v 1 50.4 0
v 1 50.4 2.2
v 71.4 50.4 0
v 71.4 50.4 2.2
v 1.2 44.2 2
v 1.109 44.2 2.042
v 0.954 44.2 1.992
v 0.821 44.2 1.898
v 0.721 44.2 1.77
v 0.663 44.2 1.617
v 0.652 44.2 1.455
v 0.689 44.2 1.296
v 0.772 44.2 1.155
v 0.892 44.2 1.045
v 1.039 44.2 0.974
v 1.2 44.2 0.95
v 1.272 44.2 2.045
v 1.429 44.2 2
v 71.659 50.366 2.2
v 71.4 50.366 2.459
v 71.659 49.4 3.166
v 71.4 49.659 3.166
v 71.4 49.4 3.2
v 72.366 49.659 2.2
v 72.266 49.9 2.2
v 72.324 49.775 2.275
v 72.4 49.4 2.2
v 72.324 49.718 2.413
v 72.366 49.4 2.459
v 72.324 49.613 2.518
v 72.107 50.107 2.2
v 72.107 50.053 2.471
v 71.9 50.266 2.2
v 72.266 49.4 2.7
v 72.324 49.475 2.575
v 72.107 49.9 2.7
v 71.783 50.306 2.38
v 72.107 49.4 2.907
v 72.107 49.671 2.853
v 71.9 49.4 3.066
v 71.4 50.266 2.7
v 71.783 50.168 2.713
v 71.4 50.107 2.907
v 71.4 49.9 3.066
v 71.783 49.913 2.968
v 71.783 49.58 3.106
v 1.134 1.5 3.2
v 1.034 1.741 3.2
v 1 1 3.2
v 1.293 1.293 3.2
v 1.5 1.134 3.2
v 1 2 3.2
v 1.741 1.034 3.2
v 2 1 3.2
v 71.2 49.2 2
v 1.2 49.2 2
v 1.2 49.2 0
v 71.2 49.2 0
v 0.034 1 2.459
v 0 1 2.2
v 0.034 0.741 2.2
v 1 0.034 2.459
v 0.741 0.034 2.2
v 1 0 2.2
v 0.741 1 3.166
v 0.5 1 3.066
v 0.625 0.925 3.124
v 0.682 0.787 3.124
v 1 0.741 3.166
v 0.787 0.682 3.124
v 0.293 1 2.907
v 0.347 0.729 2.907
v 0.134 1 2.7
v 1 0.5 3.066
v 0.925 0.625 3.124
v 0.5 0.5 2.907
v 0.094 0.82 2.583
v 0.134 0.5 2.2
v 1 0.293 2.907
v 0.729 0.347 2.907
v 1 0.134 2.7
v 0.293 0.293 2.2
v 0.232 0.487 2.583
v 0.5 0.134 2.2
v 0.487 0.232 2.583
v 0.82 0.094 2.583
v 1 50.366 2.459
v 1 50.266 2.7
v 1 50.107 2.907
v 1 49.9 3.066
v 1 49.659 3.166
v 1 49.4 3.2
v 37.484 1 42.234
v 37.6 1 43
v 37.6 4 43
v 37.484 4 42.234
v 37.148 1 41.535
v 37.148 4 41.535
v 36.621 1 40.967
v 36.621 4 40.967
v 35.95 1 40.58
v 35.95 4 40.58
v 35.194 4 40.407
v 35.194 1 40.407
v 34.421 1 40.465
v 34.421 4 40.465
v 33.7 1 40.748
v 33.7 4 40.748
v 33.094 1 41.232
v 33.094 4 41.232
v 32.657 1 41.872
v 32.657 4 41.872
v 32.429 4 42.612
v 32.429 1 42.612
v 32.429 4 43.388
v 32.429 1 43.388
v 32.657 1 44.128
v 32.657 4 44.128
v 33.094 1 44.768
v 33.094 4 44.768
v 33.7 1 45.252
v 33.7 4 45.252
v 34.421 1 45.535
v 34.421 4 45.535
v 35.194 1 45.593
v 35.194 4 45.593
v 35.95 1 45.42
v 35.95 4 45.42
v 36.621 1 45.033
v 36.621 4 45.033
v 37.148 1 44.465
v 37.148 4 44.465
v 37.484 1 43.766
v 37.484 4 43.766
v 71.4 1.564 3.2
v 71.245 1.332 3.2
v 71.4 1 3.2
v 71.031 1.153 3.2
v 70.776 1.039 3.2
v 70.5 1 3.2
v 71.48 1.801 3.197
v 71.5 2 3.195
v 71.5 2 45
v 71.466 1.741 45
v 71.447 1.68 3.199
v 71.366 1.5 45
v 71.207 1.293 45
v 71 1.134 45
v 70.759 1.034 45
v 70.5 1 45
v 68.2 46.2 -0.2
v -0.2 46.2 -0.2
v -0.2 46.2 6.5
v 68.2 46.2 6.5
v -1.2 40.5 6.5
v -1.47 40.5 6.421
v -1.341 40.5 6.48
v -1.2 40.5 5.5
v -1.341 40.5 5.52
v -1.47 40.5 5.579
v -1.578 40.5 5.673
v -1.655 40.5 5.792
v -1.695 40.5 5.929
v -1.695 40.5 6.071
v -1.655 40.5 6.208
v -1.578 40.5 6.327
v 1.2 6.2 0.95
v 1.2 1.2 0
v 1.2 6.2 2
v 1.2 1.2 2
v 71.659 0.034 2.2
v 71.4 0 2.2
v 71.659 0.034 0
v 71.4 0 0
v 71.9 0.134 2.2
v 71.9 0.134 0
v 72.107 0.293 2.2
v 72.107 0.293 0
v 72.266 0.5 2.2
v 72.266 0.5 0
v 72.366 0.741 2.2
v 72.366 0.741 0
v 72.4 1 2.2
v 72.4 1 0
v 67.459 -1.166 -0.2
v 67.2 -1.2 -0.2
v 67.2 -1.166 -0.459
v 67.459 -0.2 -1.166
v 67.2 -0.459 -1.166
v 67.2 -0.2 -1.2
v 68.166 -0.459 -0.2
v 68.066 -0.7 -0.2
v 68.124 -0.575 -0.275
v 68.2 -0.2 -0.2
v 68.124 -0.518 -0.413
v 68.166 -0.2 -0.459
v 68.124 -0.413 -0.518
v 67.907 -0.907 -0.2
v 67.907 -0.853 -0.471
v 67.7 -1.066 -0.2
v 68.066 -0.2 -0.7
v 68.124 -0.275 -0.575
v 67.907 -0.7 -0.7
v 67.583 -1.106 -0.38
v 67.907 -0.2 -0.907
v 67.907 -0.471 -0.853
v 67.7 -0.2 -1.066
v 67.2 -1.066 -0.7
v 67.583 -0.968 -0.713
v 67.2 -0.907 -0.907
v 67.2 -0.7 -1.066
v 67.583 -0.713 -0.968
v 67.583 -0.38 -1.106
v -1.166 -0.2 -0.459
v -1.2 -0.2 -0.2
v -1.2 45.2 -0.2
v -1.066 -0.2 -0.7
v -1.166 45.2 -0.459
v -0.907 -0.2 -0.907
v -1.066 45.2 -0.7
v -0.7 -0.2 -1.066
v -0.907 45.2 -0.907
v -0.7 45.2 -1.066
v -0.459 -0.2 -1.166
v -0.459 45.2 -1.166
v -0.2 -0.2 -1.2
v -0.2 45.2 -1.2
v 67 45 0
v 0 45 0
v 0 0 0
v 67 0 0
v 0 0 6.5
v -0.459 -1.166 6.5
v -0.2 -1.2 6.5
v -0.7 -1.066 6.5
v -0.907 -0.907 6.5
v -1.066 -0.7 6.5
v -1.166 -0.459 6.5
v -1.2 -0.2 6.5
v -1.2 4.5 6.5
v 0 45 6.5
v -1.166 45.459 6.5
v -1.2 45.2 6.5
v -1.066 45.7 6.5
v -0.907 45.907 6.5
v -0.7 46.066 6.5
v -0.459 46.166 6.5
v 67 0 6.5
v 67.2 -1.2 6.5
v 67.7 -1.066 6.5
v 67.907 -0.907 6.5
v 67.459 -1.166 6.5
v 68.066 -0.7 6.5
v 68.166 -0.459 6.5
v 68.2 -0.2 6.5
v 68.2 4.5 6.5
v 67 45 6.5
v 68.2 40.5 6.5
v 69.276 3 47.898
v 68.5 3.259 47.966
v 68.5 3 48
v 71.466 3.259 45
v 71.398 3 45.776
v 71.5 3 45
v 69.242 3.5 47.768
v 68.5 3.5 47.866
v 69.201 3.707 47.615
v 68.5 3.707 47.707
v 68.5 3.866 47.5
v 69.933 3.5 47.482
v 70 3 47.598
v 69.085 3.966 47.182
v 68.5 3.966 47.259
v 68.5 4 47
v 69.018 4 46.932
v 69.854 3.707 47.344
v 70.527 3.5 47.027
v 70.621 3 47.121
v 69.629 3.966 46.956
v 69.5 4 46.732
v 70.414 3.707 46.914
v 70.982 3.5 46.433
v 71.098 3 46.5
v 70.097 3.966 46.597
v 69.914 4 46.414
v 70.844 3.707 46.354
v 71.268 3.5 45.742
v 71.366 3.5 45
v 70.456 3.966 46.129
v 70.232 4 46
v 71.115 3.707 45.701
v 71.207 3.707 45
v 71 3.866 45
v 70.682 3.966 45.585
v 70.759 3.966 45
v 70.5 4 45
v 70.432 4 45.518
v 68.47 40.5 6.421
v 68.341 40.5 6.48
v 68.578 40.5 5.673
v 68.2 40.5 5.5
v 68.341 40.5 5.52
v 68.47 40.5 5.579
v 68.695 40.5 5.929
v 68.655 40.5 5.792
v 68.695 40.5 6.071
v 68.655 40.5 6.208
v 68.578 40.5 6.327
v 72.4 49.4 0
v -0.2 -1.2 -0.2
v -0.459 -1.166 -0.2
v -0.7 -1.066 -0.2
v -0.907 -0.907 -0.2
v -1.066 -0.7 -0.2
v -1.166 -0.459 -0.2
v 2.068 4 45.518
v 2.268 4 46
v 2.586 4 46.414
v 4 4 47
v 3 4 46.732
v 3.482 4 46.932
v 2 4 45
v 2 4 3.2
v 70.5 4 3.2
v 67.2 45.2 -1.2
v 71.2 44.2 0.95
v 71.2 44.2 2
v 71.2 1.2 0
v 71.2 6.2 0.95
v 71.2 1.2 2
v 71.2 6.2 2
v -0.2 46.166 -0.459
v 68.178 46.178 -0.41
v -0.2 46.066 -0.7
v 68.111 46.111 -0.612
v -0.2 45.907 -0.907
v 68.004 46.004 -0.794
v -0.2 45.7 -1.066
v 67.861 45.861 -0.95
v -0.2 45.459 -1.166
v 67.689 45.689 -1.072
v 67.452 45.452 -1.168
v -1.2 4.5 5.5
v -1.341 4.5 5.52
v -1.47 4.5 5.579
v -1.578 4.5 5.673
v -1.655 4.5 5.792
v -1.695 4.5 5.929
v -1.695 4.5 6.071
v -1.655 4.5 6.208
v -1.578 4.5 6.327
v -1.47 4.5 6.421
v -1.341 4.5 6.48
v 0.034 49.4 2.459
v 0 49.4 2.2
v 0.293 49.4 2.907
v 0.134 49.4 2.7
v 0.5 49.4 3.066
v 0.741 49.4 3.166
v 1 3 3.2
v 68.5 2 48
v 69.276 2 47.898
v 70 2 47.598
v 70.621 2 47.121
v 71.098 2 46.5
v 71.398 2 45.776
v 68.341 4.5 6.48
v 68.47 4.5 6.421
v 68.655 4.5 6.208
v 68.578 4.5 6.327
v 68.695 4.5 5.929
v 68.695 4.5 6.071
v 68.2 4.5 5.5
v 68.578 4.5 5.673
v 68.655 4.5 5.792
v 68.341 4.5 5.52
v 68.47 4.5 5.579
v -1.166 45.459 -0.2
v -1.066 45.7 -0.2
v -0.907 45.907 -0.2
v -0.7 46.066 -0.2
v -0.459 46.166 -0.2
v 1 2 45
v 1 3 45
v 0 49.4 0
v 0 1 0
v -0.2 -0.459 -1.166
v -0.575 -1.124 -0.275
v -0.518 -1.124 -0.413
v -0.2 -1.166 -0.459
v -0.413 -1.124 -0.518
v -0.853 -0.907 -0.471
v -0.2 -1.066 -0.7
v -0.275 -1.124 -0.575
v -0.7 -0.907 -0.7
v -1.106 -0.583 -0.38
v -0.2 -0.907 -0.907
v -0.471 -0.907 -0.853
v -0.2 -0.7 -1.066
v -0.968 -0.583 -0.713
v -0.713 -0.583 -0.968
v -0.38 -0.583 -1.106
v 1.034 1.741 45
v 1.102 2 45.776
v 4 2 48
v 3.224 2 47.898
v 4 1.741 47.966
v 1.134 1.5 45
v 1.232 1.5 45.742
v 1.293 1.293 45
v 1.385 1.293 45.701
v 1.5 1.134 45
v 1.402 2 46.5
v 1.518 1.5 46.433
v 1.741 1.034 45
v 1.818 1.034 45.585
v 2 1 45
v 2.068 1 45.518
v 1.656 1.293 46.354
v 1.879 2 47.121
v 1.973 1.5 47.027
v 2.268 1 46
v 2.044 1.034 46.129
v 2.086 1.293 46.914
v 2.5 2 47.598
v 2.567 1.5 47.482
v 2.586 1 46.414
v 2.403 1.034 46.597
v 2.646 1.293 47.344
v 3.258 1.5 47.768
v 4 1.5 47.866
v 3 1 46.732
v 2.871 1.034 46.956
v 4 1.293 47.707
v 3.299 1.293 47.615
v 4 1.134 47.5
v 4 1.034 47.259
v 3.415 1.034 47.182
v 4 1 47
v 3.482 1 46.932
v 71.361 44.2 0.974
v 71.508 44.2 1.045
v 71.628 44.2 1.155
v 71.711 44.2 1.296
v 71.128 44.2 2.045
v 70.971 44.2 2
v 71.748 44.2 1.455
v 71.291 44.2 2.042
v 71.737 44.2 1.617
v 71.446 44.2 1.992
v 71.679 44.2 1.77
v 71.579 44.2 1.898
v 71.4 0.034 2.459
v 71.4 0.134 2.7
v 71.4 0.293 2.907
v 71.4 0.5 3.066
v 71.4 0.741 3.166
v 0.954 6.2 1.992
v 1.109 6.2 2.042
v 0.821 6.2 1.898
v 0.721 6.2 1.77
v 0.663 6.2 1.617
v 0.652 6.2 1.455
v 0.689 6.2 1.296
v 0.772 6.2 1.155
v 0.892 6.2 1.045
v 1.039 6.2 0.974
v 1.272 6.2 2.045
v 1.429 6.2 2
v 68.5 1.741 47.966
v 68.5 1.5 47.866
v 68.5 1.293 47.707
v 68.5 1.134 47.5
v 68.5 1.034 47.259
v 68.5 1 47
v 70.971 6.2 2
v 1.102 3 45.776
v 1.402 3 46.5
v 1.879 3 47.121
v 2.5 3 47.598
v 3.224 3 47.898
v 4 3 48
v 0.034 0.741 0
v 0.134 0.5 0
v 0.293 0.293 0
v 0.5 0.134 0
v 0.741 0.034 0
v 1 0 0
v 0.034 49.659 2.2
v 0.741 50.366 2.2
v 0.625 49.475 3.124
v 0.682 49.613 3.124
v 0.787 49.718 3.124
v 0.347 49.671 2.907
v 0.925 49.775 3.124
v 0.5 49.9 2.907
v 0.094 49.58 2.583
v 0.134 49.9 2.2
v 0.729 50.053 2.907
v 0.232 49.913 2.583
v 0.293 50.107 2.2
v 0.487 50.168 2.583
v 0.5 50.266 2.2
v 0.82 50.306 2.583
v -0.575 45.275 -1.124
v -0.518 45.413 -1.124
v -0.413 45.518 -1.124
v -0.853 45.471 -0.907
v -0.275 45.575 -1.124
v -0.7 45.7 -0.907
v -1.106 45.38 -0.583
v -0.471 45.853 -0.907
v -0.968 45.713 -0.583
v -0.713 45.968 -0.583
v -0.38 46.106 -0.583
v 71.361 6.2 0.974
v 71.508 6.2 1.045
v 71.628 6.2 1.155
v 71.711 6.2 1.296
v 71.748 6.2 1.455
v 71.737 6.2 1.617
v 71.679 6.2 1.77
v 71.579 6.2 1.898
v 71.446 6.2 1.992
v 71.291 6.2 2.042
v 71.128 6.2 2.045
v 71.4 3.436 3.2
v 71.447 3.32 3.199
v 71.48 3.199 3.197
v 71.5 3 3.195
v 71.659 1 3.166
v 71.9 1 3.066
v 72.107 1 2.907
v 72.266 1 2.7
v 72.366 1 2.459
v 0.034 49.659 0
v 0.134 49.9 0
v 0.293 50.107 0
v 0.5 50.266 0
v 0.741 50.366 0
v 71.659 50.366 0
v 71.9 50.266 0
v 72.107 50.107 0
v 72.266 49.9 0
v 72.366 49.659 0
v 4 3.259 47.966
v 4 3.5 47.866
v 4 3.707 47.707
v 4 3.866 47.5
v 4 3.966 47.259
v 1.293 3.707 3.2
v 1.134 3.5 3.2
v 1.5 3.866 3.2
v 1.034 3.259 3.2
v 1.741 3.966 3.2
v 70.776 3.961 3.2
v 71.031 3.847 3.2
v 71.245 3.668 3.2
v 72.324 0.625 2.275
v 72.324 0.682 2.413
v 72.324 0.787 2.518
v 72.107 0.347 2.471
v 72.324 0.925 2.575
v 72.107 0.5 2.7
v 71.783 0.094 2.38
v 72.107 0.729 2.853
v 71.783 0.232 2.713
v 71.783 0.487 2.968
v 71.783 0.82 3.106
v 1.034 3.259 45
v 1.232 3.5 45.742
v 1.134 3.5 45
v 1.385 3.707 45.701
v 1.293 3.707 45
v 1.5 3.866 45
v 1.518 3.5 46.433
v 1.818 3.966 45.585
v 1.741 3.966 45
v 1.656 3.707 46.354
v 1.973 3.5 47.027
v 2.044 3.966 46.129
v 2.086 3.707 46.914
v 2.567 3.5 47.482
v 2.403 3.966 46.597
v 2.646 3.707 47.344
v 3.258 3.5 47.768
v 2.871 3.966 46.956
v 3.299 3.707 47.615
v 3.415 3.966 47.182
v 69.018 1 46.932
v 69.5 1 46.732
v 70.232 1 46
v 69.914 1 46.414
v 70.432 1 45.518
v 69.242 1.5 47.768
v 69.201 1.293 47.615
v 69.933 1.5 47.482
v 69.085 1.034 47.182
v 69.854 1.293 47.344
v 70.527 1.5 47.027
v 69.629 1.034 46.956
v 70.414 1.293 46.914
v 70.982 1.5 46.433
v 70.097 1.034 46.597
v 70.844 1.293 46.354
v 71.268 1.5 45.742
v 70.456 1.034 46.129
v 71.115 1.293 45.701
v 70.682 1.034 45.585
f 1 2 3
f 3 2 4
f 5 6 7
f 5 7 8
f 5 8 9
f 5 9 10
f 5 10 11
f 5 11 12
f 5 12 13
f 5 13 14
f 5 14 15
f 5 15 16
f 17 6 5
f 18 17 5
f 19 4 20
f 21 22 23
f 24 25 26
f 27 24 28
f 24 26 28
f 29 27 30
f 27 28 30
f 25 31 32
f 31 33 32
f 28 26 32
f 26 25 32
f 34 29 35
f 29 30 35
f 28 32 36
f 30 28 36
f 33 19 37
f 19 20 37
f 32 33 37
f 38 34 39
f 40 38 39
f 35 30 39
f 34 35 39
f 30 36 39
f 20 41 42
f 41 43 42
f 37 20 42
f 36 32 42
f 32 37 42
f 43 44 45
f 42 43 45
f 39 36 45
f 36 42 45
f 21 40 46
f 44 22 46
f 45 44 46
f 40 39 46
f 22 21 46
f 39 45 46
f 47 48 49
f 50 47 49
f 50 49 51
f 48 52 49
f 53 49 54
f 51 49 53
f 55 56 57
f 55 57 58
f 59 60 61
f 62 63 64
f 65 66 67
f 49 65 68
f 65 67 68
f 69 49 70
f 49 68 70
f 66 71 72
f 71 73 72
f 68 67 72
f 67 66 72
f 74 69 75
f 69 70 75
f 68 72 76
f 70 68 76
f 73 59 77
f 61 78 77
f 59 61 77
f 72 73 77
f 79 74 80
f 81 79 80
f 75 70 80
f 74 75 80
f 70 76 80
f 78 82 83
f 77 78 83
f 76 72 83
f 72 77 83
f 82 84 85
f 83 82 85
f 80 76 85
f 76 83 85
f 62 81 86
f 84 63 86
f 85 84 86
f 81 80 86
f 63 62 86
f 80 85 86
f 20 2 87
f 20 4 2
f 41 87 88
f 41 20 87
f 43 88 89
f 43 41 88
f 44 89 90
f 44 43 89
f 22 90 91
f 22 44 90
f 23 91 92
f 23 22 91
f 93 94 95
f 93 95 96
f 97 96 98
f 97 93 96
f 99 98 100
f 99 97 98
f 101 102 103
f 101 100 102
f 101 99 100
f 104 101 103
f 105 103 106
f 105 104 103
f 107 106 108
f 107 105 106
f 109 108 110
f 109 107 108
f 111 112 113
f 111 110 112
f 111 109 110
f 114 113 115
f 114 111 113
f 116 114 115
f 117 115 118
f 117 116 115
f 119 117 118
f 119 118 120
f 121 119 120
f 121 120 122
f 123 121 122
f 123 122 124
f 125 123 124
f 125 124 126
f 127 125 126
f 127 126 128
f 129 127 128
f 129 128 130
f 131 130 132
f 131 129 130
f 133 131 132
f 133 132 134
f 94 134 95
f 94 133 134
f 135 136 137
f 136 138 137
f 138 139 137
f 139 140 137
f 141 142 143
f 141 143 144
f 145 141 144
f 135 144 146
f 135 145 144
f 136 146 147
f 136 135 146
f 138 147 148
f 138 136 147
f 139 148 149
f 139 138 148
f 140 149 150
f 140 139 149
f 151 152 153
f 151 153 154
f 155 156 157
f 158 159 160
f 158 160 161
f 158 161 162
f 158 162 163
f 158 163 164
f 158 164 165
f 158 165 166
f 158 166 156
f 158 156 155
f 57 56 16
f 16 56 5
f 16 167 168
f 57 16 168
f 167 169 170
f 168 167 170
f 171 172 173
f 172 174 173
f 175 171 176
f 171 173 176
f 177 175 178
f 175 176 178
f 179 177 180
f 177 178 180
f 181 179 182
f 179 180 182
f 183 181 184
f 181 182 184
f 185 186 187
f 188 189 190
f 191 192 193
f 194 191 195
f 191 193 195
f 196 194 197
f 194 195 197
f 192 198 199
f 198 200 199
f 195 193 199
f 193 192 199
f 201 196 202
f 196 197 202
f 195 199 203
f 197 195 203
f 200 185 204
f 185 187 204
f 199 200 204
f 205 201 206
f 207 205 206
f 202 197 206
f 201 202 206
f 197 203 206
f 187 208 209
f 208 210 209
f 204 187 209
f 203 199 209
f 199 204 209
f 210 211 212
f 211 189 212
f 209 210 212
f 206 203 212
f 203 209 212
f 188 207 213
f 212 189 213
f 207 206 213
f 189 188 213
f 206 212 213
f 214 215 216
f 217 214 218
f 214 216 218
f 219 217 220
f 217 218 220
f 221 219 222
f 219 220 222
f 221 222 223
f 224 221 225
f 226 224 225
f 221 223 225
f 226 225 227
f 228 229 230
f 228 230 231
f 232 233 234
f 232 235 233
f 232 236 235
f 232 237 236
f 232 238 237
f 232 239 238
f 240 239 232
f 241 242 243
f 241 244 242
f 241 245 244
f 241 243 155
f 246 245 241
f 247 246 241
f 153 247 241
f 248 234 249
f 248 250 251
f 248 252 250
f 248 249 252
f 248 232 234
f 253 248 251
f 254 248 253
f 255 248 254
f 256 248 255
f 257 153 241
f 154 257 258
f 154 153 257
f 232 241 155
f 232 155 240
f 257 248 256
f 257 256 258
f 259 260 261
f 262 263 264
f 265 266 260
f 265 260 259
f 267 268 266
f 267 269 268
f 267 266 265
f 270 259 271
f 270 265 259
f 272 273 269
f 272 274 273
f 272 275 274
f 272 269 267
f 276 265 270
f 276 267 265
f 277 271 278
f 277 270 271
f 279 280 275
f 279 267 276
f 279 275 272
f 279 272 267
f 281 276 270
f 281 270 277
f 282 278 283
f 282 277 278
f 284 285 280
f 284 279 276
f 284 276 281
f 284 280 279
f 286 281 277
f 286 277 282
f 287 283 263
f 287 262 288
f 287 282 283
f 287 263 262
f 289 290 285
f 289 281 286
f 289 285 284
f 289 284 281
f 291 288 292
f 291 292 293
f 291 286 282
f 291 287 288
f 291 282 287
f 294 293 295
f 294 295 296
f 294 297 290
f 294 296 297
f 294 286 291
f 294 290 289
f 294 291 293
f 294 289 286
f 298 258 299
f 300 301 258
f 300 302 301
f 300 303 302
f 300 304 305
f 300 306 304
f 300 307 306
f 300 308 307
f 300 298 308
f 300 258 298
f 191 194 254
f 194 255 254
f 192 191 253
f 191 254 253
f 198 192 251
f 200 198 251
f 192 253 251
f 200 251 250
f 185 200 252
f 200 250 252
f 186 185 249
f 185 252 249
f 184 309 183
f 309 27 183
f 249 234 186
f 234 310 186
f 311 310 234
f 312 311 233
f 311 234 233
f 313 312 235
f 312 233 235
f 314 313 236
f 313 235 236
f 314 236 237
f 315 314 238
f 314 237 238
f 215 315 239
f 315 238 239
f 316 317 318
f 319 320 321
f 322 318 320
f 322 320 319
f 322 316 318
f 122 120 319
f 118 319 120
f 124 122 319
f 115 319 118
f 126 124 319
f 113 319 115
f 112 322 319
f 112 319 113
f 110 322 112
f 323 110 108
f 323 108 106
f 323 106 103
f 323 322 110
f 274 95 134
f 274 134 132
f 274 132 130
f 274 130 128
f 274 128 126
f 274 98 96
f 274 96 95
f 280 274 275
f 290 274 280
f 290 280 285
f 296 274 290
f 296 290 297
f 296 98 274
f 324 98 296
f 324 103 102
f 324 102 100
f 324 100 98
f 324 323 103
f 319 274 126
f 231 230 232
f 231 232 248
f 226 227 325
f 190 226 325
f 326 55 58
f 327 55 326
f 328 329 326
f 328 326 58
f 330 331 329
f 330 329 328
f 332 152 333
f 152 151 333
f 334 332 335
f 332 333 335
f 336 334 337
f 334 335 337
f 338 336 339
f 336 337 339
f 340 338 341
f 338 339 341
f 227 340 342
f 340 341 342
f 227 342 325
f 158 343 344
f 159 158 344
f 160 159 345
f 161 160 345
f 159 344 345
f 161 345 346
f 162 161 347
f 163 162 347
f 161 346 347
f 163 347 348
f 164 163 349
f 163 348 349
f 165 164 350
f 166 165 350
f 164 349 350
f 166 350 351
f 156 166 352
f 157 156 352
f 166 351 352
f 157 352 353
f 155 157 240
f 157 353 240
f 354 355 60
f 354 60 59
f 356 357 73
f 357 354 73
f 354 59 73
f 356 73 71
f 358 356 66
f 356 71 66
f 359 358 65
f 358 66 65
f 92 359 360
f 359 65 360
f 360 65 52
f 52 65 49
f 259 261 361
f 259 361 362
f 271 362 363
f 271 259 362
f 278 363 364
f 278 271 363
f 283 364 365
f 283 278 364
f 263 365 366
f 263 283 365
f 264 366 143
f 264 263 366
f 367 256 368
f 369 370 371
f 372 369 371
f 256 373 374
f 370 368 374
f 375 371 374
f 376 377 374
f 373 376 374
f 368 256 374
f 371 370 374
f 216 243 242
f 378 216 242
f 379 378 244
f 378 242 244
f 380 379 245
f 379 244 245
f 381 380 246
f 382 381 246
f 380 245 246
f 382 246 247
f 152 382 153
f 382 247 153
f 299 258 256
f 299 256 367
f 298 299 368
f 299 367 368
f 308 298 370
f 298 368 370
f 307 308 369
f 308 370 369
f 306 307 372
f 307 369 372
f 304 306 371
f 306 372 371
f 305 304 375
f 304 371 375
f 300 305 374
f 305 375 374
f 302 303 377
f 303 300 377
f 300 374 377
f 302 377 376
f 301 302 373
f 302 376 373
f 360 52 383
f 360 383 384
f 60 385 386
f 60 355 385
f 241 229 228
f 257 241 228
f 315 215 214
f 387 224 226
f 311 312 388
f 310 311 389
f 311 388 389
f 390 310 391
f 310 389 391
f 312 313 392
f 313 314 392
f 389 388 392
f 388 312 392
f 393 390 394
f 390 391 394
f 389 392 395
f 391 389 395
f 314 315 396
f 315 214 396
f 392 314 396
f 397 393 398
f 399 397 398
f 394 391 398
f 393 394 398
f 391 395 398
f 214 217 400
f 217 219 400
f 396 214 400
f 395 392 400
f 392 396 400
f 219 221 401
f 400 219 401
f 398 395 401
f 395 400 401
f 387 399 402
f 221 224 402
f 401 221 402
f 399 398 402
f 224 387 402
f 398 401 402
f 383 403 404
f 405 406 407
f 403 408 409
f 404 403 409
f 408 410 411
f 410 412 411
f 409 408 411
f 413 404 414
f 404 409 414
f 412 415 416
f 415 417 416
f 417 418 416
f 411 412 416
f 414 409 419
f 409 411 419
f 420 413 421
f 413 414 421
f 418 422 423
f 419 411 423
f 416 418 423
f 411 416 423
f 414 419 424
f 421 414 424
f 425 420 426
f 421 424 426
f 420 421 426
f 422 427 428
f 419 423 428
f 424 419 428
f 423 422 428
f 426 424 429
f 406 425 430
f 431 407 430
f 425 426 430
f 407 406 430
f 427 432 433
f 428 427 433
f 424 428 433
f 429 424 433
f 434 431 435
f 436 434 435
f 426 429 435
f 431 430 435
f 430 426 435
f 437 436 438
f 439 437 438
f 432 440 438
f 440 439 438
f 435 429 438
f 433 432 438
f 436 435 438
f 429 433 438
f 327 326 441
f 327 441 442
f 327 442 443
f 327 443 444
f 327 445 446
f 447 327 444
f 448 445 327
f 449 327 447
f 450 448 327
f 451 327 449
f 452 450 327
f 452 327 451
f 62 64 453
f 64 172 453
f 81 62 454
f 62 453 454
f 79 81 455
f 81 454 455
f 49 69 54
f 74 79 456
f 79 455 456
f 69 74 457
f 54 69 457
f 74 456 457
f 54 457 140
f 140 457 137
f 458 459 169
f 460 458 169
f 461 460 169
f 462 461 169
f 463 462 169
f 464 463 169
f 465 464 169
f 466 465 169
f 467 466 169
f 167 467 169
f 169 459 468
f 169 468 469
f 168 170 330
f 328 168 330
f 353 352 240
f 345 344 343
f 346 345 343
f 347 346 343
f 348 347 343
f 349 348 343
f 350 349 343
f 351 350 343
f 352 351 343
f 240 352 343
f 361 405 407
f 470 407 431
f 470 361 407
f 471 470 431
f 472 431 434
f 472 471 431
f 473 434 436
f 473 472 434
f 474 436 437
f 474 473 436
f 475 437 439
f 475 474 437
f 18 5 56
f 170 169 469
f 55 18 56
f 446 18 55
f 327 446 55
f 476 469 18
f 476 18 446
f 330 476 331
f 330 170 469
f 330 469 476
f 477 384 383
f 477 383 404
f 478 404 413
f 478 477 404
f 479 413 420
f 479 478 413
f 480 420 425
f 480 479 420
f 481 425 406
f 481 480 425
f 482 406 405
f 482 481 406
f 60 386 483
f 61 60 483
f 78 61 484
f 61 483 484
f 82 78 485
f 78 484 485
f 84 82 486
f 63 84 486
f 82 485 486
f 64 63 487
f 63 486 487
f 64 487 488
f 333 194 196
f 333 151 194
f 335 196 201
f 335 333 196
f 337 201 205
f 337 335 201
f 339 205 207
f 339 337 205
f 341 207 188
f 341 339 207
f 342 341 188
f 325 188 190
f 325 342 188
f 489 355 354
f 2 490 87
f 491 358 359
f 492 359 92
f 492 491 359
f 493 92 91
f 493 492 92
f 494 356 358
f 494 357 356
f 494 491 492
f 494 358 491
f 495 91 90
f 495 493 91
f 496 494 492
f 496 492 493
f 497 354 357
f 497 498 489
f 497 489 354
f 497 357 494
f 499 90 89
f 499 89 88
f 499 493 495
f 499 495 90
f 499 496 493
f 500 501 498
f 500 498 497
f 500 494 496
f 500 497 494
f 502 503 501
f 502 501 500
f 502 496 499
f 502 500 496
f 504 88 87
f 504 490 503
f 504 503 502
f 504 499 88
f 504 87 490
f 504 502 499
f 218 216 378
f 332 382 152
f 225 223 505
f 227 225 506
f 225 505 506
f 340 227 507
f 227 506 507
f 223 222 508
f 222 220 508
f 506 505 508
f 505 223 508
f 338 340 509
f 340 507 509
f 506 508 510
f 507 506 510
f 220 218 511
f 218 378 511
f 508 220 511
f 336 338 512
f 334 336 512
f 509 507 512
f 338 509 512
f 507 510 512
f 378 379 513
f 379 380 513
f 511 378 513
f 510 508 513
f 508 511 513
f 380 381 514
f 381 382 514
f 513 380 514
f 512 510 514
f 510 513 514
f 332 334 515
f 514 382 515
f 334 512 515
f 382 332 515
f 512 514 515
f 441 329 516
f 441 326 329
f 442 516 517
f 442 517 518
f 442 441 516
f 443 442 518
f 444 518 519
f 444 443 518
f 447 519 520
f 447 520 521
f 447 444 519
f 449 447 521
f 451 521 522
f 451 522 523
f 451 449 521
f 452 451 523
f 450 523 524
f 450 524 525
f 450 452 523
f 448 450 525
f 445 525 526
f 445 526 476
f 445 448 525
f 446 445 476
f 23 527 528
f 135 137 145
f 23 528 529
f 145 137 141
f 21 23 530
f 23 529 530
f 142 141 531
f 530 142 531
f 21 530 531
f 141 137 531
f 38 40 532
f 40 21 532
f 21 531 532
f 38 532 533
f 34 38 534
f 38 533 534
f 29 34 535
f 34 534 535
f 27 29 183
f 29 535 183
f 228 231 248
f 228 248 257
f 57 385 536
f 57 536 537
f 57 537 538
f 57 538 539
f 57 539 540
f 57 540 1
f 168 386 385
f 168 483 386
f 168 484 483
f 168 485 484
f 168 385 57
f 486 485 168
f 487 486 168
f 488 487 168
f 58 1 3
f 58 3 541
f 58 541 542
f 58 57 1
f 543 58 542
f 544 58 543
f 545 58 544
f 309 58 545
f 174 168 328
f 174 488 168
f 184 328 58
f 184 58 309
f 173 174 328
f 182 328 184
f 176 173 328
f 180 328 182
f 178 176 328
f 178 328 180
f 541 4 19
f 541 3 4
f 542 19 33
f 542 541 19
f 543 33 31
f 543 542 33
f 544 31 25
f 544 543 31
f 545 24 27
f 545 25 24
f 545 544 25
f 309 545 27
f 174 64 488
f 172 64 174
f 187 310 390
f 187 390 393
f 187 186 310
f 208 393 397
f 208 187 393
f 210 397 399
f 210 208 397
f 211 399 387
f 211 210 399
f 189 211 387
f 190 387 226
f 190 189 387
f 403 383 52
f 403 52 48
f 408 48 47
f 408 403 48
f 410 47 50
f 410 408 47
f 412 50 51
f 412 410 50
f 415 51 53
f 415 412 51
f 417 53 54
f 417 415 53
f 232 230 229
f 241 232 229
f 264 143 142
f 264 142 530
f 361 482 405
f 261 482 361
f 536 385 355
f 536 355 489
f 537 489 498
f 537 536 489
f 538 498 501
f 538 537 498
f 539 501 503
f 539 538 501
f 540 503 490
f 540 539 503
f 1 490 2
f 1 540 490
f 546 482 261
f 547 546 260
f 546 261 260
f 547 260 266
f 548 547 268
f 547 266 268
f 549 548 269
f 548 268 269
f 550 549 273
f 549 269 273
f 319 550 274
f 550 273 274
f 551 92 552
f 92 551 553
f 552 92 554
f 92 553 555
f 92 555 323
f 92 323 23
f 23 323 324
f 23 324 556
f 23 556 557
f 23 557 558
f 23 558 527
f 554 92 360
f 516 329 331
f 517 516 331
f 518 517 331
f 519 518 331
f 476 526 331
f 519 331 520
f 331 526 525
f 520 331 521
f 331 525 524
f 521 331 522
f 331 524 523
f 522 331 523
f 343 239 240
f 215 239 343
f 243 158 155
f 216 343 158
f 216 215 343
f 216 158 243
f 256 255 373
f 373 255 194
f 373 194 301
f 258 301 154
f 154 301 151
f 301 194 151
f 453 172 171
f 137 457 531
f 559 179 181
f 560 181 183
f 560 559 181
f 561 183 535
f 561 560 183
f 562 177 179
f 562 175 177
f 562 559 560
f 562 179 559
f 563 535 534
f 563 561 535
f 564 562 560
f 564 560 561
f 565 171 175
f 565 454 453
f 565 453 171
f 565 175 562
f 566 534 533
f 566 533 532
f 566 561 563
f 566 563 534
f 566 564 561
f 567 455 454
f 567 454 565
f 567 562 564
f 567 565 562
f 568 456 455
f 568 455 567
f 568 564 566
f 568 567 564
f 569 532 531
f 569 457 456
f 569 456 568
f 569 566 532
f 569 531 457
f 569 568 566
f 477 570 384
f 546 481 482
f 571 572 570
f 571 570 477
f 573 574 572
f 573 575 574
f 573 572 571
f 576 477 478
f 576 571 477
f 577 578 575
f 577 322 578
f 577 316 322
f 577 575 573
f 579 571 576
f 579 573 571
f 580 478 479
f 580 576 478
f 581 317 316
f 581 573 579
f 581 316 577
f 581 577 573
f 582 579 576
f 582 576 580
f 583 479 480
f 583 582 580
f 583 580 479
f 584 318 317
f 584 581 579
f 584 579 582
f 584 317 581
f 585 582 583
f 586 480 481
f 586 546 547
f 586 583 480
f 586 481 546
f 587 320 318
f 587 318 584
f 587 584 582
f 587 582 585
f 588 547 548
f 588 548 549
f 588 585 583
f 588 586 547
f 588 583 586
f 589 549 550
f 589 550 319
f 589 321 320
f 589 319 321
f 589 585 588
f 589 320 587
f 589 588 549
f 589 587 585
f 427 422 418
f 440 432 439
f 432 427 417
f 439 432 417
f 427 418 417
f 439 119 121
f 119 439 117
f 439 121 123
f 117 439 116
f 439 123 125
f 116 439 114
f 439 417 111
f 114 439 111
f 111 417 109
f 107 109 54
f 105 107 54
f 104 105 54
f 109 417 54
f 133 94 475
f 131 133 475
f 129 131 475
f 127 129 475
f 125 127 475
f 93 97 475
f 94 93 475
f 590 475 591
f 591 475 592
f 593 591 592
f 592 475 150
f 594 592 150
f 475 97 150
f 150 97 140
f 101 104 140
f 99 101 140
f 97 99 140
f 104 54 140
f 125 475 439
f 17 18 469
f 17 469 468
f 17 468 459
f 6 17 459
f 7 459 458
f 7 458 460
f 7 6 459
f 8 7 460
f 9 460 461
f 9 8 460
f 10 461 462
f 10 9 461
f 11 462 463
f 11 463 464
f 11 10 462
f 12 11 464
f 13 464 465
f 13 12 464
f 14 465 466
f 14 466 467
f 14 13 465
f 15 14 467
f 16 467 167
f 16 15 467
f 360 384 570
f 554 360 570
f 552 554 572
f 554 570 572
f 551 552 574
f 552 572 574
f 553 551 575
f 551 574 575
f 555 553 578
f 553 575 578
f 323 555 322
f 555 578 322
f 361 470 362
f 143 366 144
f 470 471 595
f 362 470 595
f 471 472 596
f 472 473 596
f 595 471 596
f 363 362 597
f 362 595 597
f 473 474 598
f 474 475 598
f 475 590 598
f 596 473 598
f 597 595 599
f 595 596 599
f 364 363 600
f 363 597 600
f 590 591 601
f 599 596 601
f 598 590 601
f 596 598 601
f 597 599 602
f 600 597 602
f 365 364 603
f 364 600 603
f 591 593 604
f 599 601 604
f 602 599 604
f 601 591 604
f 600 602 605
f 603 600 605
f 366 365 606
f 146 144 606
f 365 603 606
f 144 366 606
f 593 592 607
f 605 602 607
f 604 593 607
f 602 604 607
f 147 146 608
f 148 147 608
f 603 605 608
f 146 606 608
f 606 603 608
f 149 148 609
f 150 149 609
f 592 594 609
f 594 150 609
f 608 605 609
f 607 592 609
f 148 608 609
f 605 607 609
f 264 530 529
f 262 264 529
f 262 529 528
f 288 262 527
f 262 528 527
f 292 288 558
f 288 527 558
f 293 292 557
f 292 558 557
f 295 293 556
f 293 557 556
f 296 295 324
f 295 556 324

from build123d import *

# Parameters (mm, degrees)
TONGUE_LEFT_R             = 0.5
TONGUE_LEFT_DEPTH         = 36
TONGUE_RIGHT_R            = 0.5
TONGUE_RIGHT_DEPTH        = 36
CASE_INSIDE_W             = 67
CASE_INSIDE_H             = 45
CASE_INSIDE_DEPTH         = 6.5
CASE_OUTSIDE_W            = 69.4
CASE_OUTSIDE_H            = 47.4
CASE_OUTSIDE_DEPTH        = 7.7
FILLET_R                  = 1
CYLINDER_R                = 2.6
CYLINDER_DEPTH            = 10
BOX_W                     = 70.5
BOX_H                     = 3
BOX_DEPTH                 = 45
FILLET002_R               = 3
FILLET003_R               = 1
LID_GROOVE_LEFT_R         = 0.55
LID_GROOVE_LEFT_DEPTH     = 38
LID_GROOVE_RIGHT_R        = 0.55
LID_GROOVE_RIGHT_DEPTH    = 38
LID_INSIDE_W              = 70
LID_INSIDE_H              = 48
LID_INSIDE_DEPTH          = 2
LID_OUTSIDE_W             = 72.4
LID_OUTSIDE_H             = 50.4
LID_OUTSIDE_DEPTH         = 3.2
FILLET001_R               = 1
FILLET001_PLACEMENT_ANGLE = 180


with BuildPart() as tongue_left:
    # tongue_left → tongue_left (new body)
    with BuildSketch(Plane(origin=(-1.2, 4.5, 6), x_dir=(1, 0, 0), z_dir=(0, 1, 0))):
        Circle(TONGUE_LEFT_R)
    extrude(amount=TONGUE_LEFT_DEPTH)


with BuildPart() as tongue_right:
    # tongue_right → tongue_right (new body)
    with BuildSketch(Plane(origin=(68.2, 4.5, 6), x_dir=(1, 0, 0), z_dir=(0, 1, 0))):
        Circle(TONGUE_RIGHT_R)
    extrude(amount=TONGUE_RIGHT_DEPTH)


with BuildPart() as case_inside:
    # case_inside → case_inside (new body)
    with BuildSketch(Plane.XY):
        with Locations((33.5, 22.5)):
            Rectangle(CASE_INSIDE_W, CASE_INSIDE_H)
    extrude(amount=CASE_INSIDE_DEPTH)


with BuildPart() as fillet_body:
    # case_outside → case_outside (new body)
    with BuildSketch(Plane(origin=(-1.2, -1.2, -1.2), x_dir=(1, 0, 0), z_dir=(0, 0, 1))):
        with Locations((34.7, 23.7)):
            Rectangle(CASE_OUTSIDE_W, CASE_OUTSIDE_H)
    extrude(amount=CASE_OUTSIDE_DEPTH)

    # Cut: cut case_inside
    add(case_inside.part, mode=Mode.SUBTRACT)

    # Fusion: union tongue_left, tongue_right
    add(tongue_left.part)
    add(tongue_right.part)

    # Fillet
    fillet_edges = [fillet_body.edges().sort_by_distance(p)[0] for p in [
        (-1.2, 46.2, 2.65),
        (-1.2, 22.5, -1.2),
        (-1.2, -1.2, 2.65),
        (33.5, 46.2, -1.2),
        (33.5, -1.2, -1.2),
        (68.2, -1.2, 2.65),
        (68.2, 22.5, -1.2),
    ]]
    fillet(fillet_edges, radius=FILLET_R)


with BuildPart() as cylinder:
    # Cylinder → Cylinder (new body)
    with BuildSketch(Plane(origin=(35, 0, 43), x_dir=(1, 0, 0), z_dir=(0, 1, 0))):
        Circle(CYLINDER_R)
    extrude(amount=CYLINDER_DEPTH)


with BuildPart() as fillet003:
    # Box → Box (new body)
    with BuildSketch(Plane(origin=(1, 1, 3), x_dir=(1, 0, 0), z_dir=(0, 0, 1))):
        with Locations((35.25, 1.5)):
            Rectangle(BOX_W, BOX_H)
    extrude(amount=BOX_DEPTH)

    # Cut004: cut Cylinder
    add(cylinder.part, mode=Mode.SUBTRACT)

    # Fillet002
    fillet002_edges = [fillet003.edges().sort_by_distance(p)[0] for p in [
        (1, 2.5, 48),
        (71.5, 2.5, 48),
    ]]
    fillet(fillet002_edges, radius=FILLET002_R)

    # Fillet003
    fillet003_edges = [fillet003.edges().sort_by_distance(p)[0] for p in [
        (1, 1, 24),
        (1, 4, 24),
        (36.25, 1, 48),
        (36.25, 4, 48),
    ]]
    fillet(fillet003_edges, radius=FILLET003_R)


with BuildPart() as lid_groove_left:
    # lid_groove_left → lid_groove_left (new body)
    with BuildSketch(Plane(origin=(-1.5, 3.5, 0.5), x_dir=(1, 0, 0), z_dir=(0, 1, 0))):
        Circle(LID_GROOVE_LEFT_R)
    extrude(amount=LID_GROOVE_LEFT_DEPTH)


with BuildPart() as lid_groove_right:
    # lid_groove_right → lid_groove_right (new body)
    with BuildSketch(Plane(origin=(68.5, 3.5, 0.5), x_dir=(1, 0, 0), z_dir=(0, 1, 0))):
        Circle(LID_GROOVE_RIGHT_R)
    extrude(amount=LID_GROOVE_RIGHT_DEPTH)


with BuildPart() as lid_inside:
    # lid_inside → lid_inside (new body)
    with BuildSketch(Plane(origin=(-1.5, -1.5, 0), x_dir=(1, 0, 0), z_dir=(0, 0, 1))):
        with Locations((35, 24)):
            Rectangle(LID_INSIDE_W, LID_INSIDE_H)
    extrude(amount=LID_INSIDE_DEPTH)


with BuildPart() as lid_with_led_holder:
    # lid_outside → lid_outside (new body)
    with BuildSketch(Plane(origin=(-2.7, -2.7, -1.2), x_dir=(1, 0, 0), z_dir=(0, 0, 1))):
        with Locations((36.2, 25.2)):
            Rectangle(LID_OUTSIDE_W, LID_OUTSIDE_H)
    extrude(amount=LID_OUTSIDE_DEPTH)

    # Cut001: cut lid_inside
    add(lid_inside.part, mode=Mode.SUBTRACT)

    # Cut002: cut lid_groove_right
    add(lid_groove_right.part, mode=Mode.SUBTRACT)

    # Cut003: cut lid_groove_left
    add(lid_groove_left.part, mode=Mode.SUBTRACT)

    # Fillet001
    fillet001_edges = [lid_with_led_holder.edges().sort_by_distance(p)[0] for p in [
        (-2.7, -2.7, 0.4),
        (-2.7, 47.7, 0.4),
        (-2.7, 22.5, -1.2),
        (33.5, -2.7, -1.2),
        (69.7, -2.7, 0.4),
        (33.5, 47.7, -1.2),
        (69.7, 47.7, 0.4),
        (69.7, 22.5, -1.2),
    ]]
    fillet(fillet001_edges, radius=FILLET001_R)


with BuildPart() as lid_with_led_holder_1:
    # Fillet001 placement: moved
    add(lid_with_led_holder.part.moved(Location((2.7, 47.7, 2))).rotate(Axis((2.7, 47.7, 2), (1, 0, 0)), FILLET001_PLACEMENT_ANGLE))

    # Fusion001: union Fillet003
    add(fillet003.part)


solid = Compound([fillet_body.part, lid_with_led_holder_1.part])
